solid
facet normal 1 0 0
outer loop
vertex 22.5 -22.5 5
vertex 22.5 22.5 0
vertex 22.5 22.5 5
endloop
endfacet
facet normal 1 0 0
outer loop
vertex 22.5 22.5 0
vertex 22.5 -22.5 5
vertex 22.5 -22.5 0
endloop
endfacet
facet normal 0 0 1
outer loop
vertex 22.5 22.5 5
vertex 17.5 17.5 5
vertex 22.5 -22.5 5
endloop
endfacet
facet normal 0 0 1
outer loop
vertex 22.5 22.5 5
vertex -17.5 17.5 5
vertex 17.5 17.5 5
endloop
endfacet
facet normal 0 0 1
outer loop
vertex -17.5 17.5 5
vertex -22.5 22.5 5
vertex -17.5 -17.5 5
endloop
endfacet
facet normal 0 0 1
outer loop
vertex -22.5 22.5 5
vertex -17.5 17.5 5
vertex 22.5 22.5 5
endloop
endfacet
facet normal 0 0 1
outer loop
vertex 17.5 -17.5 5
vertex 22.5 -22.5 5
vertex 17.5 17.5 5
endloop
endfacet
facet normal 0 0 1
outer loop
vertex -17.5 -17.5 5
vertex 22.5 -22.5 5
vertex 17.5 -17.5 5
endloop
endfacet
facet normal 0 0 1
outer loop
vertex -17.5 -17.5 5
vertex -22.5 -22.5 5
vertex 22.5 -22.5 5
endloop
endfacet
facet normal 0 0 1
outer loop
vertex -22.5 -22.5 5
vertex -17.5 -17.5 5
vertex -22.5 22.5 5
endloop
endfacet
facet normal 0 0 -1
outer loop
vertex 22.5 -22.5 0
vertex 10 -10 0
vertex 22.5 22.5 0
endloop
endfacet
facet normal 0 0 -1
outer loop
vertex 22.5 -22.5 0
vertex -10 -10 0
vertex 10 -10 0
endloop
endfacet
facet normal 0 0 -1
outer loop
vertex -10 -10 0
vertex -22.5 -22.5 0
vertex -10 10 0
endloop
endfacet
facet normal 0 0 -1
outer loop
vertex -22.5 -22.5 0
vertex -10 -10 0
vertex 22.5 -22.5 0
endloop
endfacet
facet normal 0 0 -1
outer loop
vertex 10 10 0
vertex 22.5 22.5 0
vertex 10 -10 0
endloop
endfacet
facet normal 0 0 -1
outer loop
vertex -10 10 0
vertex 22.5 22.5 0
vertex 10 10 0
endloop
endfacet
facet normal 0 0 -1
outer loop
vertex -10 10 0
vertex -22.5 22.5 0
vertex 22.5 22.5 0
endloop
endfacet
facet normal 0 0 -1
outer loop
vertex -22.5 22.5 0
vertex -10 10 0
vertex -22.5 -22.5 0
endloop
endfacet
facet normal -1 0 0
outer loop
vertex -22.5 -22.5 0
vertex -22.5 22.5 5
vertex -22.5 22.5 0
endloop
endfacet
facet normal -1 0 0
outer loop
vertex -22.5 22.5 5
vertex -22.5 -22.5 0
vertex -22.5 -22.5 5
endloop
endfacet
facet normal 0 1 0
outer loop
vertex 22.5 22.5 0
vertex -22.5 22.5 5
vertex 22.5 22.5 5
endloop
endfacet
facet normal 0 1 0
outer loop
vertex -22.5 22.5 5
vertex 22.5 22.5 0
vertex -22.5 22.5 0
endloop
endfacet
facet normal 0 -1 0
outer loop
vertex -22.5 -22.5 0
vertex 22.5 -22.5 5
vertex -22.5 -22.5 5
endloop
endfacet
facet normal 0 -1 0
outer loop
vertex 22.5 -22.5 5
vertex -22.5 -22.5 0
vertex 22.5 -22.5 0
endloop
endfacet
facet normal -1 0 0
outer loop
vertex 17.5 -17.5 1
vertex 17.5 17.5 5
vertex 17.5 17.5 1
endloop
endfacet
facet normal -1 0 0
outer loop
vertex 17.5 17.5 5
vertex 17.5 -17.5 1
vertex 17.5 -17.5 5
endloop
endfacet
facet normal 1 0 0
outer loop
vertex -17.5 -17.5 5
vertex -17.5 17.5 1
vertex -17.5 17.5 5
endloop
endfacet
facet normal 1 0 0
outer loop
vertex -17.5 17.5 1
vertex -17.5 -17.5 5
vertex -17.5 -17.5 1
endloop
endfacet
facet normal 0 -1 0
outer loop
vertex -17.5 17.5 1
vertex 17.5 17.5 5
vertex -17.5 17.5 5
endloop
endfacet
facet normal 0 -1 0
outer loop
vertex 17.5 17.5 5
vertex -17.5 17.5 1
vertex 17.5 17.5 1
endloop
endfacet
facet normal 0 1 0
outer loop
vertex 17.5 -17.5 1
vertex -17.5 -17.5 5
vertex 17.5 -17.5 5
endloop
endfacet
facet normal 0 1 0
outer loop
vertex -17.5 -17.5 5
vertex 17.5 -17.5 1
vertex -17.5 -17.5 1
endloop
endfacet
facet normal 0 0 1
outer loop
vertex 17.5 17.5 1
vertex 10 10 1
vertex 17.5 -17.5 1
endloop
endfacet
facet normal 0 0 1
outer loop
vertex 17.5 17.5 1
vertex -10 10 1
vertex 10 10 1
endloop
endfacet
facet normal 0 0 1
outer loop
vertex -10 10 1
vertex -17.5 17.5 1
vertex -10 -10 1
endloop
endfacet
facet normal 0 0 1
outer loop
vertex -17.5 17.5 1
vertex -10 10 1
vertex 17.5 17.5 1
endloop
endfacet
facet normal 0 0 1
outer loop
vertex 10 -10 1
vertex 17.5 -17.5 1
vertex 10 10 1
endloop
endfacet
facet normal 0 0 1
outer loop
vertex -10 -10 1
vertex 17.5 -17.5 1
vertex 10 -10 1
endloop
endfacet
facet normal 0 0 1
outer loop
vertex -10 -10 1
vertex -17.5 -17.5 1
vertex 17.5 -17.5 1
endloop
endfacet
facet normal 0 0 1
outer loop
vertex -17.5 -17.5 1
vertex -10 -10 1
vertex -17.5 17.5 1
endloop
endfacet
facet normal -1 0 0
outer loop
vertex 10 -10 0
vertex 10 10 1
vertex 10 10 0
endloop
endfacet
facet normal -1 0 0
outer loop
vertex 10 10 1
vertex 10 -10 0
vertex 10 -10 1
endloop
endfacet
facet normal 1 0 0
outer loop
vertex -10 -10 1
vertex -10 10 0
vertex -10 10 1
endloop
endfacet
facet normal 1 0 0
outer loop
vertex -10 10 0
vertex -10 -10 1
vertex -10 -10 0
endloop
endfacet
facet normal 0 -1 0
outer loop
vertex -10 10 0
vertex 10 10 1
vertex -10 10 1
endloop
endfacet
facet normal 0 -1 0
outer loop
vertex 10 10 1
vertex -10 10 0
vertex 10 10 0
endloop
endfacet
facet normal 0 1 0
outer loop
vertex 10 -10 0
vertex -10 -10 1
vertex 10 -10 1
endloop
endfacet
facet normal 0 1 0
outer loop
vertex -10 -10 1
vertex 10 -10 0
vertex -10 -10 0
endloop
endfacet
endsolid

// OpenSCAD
//Simple square mask
//Jeffrey Moffitt
//jeffmoffitt@gmail.com
//November 13, 2015
//CC BY NC SA

//Add the thread module

//Units are mm

//Define module
union(){
    difference(){
        translate([0,0,2.5])cube(size=[45, 45, 5], center=true);
        translate([0,0,2.5])cube(size=[35, 35, 5.1], center=true);
    }
    difference(){
        translate([0,0,0.5])cube(size=[45, 45, 1], center=true);
        translate([0,0,0.5])cube(size=[20,20,1.1], center=true);
    }
}
